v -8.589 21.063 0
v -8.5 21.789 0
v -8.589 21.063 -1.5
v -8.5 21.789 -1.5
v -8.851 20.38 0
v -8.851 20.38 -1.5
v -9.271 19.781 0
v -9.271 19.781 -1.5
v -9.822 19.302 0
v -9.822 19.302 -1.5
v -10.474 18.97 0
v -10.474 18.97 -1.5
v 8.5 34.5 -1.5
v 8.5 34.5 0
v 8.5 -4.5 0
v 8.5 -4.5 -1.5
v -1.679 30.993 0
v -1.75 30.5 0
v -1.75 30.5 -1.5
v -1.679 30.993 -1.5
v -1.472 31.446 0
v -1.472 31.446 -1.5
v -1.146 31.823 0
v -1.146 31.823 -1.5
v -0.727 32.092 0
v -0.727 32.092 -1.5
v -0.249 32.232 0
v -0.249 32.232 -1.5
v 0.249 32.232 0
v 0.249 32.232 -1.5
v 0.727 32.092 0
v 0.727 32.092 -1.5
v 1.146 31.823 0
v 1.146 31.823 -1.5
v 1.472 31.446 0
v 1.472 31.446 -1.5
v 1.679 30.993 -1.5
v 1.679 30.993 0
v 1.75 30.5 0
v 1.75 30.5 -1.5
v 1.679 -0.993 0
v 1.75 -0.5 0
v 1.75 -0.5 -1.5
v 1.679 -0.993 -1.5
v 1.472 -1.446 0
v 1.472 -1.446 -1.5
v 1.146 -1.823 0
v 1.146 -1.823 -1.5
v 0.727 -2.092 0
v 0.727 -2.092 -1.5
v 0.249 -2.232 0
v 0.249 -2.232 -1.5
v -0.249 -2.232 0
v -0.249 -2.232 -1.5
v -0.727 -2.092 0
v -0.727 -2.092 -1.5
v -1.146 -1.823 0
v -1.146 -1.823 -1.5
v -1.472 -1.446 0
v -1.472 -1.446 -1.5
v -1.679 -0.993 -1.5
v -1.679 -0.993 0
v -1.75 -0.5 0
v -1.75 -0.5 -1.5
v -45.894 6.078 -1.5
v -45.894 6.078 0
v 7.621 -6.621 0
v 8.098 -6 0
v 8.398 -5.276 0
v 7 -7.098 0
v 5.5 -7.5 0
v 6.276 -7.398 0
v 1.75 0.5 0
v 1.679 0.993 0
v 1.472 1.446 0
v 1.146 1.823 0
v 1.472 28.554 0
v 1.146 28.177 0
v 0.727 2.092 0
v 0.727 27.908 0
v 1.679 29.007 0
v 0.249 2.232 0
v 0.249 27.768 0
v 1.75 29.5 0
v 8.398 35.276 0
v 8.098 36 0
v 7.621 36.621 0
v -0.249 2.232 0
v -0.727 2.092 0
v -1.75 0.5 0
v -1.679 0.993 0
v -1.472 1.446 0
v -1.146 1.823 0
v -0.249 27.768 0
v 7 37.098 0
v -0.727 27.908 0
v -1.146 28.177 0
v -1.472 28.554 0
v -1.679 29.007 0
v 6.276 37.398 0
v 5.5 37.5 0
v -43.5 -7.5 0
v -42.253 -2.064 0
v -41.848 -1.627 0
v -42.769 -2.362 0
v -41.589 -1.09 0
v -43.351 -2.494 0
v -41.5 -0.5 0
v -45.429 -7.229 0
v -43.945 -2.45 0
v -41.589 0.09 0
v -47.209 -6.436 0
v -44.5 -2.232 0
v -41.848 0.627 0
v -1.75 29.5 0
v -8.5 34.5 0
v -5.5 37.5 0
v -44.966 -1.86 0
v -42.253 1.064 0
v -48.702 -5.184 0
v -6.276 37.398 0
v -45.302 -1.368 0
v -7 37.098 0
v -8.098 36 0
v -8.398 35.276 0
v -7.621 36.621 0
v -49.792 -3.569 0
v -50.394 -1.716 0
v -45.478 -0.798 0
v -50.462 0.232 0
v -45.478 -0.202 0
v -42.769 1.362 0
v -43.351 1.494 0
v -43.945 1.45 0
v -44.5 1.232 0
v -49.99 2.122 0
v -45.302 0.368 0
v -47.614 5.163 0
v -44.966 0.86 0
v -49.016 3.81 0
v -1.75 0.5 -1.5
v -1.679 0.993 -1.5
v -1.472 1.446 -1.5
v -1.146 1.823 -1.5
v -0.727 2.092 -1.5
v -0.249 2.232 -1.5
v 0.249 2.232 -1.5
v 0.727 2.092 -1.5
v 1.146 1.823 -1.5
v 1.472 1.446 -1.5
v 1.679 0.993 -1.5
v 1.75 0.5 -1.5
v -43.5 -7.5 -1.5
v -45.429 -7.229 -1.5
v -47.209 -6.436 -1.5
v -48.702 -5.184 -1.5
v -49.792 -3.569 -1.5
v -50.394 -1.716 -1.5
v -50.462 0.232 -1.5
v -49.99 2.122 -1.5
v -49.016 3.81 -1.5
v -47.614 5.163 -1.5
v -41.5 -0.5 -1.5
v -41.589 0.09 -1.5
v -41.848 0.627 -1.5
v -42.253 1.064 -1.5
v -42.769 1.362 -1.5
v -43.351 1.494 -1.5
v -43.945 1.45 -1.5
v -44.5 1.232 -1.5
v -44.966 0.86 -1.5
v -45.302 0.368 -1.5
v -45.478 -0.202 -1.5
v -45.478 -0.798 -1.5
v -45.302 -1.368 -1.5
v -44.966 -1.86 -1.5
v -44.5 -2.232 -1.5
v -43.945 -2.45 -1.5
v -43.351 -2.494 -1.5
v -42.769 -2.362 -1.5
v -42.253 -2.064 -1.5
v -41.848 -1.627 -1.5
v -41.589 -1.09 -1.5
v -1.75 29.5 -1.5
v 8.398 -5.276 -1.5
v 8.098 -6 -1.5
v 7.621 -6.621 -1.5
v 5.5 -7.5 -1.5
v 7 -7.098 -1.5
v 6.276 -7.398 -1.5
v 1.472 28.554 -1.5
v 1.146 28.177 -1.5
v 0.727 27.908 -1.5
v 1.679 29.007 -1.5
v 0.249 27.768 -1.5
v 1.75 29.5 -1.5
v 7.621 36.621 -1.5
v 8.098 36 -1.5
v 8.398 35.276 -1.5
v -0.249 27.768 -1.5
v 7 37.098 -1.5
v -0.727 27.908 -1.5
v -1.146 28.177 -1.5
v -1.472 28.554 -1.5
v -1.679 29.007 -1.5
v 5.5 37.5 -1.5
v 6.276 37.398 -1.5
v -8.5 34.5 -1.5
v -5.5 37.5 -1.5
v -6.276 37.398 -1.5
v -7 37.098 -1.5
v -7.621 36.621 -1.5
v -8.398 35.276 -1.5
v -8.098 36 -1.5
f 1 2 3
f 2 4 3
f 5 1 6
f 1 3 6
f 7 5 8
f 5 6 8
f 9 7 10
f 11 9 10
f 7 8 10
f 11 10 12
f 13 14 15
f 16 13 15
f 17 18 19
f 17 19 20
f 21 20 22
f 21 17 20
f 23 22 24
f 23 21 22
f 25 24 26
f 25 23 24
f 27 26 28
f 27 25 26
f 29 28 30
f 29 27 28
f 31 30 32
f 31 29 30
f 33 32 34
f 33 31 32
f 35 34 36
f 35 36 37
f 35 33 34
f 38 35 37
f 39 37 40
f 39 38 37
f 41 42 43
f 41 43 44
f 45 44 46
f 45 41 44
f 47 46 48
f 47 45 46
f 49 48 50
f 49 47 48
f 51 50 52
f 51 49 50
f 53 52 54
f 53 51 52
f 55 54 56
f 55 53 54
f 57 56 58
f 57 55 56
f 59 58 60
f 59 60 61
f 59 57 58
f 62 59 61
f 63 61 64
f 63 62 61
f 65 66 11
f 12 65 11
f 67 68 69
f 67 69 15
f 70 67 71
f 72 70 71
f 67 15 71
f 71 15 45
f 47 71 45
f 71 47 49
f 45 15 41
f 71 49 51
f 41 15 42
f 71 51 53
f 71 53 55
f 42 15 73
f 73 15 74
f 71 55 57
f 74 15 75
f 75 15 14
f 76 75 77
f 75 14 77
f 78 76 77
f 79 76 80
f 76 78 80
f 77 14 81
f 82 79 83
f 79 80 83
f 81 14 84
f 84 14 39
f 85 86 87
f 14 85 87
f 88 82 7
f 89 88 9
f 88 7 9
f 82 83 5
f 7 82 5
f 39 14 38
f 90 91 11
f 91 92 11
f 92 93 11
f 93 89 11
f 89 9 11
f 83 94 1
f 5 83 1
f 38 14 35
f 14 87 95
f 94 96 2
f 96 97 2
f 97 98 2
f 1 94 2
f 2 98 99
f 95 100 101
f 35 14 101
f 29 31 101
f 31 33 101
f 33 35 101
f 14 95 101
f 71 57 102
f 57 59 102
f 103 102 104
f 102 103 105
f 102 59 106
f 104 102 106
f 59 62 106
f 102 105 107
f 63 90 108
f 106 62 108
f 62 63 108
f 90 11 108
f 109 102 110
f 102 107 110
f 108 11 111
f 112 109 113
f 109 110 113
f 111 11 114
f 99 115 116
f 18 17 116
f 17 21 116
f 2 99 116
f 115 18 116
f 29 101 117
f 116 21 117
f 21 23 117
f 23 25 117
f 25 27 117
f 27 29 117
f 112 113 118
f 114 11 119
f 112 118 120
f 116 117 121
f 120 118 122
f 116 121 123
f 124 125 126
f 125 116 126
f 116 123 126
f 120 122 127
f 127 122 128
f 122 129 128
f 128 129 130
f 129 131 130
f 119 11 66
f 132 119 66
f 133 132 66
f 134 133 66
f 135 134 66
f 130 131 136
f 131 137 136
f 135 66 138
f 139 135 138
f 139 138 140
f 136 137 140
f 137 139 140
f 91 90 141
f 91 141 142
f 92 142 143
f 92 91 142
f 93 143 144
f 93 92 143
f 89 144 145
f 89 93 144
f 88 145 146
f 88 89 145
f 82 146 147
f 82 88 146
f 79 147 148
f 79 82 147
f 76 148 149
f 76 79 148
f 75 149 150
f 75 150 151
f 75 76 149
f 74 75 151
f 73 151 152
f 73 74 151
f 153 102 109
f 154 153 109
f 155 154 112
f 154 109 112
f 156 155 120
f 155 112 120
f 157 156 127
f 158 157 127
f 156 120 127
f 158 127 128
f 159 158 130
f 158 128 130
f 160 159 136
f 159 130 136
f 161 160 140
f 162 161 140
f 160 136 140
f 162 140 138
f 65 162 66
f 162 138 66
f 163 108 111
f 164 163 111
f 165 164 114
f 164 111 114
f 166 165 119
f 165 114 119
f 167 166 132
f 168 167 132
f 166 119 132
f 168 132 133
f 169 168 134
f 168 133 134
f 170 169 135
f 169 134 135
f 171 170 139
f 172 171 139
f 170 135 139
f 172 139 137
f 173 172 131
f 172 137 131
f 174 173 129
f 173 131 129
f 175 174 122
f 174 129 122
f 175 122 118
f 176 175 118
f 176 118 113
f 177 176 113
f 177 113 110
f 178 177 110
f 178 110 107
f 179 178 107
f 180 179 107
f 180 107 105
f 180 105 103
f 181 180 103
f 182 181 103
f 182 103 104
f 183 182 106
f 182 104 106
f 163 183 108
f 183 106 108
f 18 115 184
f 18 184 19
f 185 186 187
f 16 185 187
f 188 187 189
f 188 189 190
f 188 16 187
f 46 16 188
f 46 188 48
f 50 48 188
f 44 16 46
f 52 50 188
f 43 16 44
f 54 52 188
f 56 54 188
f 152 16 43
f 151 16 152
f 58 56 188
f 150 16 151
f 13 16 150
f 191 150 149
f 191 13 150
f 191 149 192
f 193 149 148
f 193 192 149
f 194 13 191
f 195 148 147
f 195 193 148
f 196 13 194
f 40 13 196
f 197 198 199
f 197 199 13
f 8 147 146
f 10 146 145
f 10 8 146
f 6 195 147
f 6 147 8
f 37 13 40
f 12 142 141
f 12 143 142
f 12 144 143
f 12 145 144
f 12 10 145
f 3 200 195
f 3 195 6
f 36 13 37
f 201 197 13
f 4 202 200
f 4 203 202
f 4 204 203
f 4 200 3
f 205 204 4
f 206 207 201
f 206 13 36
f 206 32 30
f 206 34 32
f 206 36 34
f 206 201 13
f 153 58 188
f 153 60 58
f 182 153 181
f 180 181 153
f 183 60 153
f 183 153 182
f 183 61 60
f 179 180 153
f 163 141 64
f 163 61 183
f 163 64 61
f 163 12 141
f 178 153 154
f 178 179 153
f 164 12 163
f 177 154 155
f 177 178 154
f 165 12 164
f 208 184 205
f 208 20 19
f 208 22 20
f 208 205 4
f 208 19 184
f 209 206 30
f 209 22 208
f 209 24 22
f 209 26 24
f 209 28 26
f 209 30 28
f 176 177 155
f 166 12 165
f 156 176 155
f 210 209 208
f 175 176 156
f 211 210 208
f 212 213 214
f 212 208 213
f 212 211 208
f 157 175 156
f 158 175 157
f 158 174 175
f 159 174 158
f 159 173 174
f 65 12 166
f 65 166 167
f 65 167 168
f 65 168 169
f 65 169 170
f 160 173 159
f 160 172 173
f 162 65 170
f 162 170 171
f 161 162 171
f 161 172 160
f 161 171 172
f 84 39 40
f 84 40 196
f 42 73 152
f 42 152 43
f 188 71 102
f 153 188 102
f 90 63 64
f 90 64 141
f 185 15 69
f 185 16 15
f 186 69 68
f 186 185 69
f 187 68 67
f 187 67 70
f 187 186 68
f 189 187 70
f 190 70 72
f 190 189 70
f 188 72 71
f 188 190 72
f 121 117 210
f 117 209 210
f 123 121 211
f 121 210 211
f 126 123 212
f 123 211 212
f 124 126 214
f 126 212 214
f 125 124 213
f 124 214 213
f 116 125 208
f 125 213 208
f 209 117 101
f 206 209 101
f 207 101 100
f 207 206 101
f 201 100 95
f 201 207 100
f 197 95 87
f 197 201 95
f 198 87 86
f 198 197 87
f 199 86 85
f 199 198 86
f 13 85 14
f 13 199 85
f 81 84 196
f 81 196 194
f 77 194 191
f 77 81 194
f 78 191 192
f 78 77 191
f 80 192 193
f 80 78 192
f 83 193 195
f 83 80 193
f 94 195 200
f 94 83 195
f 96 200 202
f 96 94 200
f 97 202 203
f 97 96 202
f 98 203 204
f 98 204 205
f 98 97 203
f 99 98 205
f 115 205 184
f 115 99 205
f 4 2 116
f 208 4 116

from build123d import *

# Parameters (mm, degrees)
ESQUISSE1_R               = 2
T_LE_DE_BASE_PLI_E1_DEPTH = 1.5
CONG_1_R                  = 3


# Sheet-metal steps are written as plain solids
with BuildPart() as part:
    # Esquisse1 → Tôle de base pliée1 (new body)
    with BuildSketch(Plane.XY):
        with BuildLine():
            Line((-8.5, 37.5), (8.5, 37.5))
            Line((8.5, 37.5), (8.5, -7.5))
            Line((8.5, -7.5), (-43.5, -7.5))
            ThreePointArc((-43.5, -7.5), (-50.393654271, -1.715537244), (-45.894141003, 6.077848346))
            Line((-45.894141003, 6.077848346), (-8.5, 19.688202607))
            Line((-8.5, 19.688202607), (-8.5, 37.5))
        make_face()
        with Locations((-43.5, -0.5)):
            Circle(ESQUISSE1_R, mode=Mode.SUBTRACT)
        with BuildLine():
            Line((1.75, 0.5), (1.75, -0.5))
            ThreePointArc((1.75, -0.5), (0, -2.25), (-1.75, -0.5))
            Line((-1.75, -0.5), (-1.75, 0.5))
            ThreePointArc((-1.75, 0.5), (0, 2.25), (1.75, 0.5))
        make_face(mode=Mode.SUBTRACT)
        with BuildLine():
            Line((1.75, 30.5), (1.75, 29.5))
            ThreePointArc((1.75, 29.5), (0, 27.75), (-1.75, 29.5))
            Line((-1.75, 29.5), (-1.75, 30.5))
            ThreePointArc((-1.75, 30.5), (0, 32.25), (1.75, 30.5))
        make_face(mode=Mode.SUBTRACT)
    extrude(amount=-T_LE_DE_BASE_PLI_E1_DEPTH)

    # Congé1
    cong_1_edges = [part.edges().sort_by_distance(p)[0] for p in [
        (-8.5, 37.5, -0.75),
        (8.5, 37.5, -0.75),
        (8.5, -7.5, -0.75),
        (-8.5, 19.688202607, -0.75),
    ]]
    fillet(cong_1_edges, radius=CONG_1_R)


solid = part.part
